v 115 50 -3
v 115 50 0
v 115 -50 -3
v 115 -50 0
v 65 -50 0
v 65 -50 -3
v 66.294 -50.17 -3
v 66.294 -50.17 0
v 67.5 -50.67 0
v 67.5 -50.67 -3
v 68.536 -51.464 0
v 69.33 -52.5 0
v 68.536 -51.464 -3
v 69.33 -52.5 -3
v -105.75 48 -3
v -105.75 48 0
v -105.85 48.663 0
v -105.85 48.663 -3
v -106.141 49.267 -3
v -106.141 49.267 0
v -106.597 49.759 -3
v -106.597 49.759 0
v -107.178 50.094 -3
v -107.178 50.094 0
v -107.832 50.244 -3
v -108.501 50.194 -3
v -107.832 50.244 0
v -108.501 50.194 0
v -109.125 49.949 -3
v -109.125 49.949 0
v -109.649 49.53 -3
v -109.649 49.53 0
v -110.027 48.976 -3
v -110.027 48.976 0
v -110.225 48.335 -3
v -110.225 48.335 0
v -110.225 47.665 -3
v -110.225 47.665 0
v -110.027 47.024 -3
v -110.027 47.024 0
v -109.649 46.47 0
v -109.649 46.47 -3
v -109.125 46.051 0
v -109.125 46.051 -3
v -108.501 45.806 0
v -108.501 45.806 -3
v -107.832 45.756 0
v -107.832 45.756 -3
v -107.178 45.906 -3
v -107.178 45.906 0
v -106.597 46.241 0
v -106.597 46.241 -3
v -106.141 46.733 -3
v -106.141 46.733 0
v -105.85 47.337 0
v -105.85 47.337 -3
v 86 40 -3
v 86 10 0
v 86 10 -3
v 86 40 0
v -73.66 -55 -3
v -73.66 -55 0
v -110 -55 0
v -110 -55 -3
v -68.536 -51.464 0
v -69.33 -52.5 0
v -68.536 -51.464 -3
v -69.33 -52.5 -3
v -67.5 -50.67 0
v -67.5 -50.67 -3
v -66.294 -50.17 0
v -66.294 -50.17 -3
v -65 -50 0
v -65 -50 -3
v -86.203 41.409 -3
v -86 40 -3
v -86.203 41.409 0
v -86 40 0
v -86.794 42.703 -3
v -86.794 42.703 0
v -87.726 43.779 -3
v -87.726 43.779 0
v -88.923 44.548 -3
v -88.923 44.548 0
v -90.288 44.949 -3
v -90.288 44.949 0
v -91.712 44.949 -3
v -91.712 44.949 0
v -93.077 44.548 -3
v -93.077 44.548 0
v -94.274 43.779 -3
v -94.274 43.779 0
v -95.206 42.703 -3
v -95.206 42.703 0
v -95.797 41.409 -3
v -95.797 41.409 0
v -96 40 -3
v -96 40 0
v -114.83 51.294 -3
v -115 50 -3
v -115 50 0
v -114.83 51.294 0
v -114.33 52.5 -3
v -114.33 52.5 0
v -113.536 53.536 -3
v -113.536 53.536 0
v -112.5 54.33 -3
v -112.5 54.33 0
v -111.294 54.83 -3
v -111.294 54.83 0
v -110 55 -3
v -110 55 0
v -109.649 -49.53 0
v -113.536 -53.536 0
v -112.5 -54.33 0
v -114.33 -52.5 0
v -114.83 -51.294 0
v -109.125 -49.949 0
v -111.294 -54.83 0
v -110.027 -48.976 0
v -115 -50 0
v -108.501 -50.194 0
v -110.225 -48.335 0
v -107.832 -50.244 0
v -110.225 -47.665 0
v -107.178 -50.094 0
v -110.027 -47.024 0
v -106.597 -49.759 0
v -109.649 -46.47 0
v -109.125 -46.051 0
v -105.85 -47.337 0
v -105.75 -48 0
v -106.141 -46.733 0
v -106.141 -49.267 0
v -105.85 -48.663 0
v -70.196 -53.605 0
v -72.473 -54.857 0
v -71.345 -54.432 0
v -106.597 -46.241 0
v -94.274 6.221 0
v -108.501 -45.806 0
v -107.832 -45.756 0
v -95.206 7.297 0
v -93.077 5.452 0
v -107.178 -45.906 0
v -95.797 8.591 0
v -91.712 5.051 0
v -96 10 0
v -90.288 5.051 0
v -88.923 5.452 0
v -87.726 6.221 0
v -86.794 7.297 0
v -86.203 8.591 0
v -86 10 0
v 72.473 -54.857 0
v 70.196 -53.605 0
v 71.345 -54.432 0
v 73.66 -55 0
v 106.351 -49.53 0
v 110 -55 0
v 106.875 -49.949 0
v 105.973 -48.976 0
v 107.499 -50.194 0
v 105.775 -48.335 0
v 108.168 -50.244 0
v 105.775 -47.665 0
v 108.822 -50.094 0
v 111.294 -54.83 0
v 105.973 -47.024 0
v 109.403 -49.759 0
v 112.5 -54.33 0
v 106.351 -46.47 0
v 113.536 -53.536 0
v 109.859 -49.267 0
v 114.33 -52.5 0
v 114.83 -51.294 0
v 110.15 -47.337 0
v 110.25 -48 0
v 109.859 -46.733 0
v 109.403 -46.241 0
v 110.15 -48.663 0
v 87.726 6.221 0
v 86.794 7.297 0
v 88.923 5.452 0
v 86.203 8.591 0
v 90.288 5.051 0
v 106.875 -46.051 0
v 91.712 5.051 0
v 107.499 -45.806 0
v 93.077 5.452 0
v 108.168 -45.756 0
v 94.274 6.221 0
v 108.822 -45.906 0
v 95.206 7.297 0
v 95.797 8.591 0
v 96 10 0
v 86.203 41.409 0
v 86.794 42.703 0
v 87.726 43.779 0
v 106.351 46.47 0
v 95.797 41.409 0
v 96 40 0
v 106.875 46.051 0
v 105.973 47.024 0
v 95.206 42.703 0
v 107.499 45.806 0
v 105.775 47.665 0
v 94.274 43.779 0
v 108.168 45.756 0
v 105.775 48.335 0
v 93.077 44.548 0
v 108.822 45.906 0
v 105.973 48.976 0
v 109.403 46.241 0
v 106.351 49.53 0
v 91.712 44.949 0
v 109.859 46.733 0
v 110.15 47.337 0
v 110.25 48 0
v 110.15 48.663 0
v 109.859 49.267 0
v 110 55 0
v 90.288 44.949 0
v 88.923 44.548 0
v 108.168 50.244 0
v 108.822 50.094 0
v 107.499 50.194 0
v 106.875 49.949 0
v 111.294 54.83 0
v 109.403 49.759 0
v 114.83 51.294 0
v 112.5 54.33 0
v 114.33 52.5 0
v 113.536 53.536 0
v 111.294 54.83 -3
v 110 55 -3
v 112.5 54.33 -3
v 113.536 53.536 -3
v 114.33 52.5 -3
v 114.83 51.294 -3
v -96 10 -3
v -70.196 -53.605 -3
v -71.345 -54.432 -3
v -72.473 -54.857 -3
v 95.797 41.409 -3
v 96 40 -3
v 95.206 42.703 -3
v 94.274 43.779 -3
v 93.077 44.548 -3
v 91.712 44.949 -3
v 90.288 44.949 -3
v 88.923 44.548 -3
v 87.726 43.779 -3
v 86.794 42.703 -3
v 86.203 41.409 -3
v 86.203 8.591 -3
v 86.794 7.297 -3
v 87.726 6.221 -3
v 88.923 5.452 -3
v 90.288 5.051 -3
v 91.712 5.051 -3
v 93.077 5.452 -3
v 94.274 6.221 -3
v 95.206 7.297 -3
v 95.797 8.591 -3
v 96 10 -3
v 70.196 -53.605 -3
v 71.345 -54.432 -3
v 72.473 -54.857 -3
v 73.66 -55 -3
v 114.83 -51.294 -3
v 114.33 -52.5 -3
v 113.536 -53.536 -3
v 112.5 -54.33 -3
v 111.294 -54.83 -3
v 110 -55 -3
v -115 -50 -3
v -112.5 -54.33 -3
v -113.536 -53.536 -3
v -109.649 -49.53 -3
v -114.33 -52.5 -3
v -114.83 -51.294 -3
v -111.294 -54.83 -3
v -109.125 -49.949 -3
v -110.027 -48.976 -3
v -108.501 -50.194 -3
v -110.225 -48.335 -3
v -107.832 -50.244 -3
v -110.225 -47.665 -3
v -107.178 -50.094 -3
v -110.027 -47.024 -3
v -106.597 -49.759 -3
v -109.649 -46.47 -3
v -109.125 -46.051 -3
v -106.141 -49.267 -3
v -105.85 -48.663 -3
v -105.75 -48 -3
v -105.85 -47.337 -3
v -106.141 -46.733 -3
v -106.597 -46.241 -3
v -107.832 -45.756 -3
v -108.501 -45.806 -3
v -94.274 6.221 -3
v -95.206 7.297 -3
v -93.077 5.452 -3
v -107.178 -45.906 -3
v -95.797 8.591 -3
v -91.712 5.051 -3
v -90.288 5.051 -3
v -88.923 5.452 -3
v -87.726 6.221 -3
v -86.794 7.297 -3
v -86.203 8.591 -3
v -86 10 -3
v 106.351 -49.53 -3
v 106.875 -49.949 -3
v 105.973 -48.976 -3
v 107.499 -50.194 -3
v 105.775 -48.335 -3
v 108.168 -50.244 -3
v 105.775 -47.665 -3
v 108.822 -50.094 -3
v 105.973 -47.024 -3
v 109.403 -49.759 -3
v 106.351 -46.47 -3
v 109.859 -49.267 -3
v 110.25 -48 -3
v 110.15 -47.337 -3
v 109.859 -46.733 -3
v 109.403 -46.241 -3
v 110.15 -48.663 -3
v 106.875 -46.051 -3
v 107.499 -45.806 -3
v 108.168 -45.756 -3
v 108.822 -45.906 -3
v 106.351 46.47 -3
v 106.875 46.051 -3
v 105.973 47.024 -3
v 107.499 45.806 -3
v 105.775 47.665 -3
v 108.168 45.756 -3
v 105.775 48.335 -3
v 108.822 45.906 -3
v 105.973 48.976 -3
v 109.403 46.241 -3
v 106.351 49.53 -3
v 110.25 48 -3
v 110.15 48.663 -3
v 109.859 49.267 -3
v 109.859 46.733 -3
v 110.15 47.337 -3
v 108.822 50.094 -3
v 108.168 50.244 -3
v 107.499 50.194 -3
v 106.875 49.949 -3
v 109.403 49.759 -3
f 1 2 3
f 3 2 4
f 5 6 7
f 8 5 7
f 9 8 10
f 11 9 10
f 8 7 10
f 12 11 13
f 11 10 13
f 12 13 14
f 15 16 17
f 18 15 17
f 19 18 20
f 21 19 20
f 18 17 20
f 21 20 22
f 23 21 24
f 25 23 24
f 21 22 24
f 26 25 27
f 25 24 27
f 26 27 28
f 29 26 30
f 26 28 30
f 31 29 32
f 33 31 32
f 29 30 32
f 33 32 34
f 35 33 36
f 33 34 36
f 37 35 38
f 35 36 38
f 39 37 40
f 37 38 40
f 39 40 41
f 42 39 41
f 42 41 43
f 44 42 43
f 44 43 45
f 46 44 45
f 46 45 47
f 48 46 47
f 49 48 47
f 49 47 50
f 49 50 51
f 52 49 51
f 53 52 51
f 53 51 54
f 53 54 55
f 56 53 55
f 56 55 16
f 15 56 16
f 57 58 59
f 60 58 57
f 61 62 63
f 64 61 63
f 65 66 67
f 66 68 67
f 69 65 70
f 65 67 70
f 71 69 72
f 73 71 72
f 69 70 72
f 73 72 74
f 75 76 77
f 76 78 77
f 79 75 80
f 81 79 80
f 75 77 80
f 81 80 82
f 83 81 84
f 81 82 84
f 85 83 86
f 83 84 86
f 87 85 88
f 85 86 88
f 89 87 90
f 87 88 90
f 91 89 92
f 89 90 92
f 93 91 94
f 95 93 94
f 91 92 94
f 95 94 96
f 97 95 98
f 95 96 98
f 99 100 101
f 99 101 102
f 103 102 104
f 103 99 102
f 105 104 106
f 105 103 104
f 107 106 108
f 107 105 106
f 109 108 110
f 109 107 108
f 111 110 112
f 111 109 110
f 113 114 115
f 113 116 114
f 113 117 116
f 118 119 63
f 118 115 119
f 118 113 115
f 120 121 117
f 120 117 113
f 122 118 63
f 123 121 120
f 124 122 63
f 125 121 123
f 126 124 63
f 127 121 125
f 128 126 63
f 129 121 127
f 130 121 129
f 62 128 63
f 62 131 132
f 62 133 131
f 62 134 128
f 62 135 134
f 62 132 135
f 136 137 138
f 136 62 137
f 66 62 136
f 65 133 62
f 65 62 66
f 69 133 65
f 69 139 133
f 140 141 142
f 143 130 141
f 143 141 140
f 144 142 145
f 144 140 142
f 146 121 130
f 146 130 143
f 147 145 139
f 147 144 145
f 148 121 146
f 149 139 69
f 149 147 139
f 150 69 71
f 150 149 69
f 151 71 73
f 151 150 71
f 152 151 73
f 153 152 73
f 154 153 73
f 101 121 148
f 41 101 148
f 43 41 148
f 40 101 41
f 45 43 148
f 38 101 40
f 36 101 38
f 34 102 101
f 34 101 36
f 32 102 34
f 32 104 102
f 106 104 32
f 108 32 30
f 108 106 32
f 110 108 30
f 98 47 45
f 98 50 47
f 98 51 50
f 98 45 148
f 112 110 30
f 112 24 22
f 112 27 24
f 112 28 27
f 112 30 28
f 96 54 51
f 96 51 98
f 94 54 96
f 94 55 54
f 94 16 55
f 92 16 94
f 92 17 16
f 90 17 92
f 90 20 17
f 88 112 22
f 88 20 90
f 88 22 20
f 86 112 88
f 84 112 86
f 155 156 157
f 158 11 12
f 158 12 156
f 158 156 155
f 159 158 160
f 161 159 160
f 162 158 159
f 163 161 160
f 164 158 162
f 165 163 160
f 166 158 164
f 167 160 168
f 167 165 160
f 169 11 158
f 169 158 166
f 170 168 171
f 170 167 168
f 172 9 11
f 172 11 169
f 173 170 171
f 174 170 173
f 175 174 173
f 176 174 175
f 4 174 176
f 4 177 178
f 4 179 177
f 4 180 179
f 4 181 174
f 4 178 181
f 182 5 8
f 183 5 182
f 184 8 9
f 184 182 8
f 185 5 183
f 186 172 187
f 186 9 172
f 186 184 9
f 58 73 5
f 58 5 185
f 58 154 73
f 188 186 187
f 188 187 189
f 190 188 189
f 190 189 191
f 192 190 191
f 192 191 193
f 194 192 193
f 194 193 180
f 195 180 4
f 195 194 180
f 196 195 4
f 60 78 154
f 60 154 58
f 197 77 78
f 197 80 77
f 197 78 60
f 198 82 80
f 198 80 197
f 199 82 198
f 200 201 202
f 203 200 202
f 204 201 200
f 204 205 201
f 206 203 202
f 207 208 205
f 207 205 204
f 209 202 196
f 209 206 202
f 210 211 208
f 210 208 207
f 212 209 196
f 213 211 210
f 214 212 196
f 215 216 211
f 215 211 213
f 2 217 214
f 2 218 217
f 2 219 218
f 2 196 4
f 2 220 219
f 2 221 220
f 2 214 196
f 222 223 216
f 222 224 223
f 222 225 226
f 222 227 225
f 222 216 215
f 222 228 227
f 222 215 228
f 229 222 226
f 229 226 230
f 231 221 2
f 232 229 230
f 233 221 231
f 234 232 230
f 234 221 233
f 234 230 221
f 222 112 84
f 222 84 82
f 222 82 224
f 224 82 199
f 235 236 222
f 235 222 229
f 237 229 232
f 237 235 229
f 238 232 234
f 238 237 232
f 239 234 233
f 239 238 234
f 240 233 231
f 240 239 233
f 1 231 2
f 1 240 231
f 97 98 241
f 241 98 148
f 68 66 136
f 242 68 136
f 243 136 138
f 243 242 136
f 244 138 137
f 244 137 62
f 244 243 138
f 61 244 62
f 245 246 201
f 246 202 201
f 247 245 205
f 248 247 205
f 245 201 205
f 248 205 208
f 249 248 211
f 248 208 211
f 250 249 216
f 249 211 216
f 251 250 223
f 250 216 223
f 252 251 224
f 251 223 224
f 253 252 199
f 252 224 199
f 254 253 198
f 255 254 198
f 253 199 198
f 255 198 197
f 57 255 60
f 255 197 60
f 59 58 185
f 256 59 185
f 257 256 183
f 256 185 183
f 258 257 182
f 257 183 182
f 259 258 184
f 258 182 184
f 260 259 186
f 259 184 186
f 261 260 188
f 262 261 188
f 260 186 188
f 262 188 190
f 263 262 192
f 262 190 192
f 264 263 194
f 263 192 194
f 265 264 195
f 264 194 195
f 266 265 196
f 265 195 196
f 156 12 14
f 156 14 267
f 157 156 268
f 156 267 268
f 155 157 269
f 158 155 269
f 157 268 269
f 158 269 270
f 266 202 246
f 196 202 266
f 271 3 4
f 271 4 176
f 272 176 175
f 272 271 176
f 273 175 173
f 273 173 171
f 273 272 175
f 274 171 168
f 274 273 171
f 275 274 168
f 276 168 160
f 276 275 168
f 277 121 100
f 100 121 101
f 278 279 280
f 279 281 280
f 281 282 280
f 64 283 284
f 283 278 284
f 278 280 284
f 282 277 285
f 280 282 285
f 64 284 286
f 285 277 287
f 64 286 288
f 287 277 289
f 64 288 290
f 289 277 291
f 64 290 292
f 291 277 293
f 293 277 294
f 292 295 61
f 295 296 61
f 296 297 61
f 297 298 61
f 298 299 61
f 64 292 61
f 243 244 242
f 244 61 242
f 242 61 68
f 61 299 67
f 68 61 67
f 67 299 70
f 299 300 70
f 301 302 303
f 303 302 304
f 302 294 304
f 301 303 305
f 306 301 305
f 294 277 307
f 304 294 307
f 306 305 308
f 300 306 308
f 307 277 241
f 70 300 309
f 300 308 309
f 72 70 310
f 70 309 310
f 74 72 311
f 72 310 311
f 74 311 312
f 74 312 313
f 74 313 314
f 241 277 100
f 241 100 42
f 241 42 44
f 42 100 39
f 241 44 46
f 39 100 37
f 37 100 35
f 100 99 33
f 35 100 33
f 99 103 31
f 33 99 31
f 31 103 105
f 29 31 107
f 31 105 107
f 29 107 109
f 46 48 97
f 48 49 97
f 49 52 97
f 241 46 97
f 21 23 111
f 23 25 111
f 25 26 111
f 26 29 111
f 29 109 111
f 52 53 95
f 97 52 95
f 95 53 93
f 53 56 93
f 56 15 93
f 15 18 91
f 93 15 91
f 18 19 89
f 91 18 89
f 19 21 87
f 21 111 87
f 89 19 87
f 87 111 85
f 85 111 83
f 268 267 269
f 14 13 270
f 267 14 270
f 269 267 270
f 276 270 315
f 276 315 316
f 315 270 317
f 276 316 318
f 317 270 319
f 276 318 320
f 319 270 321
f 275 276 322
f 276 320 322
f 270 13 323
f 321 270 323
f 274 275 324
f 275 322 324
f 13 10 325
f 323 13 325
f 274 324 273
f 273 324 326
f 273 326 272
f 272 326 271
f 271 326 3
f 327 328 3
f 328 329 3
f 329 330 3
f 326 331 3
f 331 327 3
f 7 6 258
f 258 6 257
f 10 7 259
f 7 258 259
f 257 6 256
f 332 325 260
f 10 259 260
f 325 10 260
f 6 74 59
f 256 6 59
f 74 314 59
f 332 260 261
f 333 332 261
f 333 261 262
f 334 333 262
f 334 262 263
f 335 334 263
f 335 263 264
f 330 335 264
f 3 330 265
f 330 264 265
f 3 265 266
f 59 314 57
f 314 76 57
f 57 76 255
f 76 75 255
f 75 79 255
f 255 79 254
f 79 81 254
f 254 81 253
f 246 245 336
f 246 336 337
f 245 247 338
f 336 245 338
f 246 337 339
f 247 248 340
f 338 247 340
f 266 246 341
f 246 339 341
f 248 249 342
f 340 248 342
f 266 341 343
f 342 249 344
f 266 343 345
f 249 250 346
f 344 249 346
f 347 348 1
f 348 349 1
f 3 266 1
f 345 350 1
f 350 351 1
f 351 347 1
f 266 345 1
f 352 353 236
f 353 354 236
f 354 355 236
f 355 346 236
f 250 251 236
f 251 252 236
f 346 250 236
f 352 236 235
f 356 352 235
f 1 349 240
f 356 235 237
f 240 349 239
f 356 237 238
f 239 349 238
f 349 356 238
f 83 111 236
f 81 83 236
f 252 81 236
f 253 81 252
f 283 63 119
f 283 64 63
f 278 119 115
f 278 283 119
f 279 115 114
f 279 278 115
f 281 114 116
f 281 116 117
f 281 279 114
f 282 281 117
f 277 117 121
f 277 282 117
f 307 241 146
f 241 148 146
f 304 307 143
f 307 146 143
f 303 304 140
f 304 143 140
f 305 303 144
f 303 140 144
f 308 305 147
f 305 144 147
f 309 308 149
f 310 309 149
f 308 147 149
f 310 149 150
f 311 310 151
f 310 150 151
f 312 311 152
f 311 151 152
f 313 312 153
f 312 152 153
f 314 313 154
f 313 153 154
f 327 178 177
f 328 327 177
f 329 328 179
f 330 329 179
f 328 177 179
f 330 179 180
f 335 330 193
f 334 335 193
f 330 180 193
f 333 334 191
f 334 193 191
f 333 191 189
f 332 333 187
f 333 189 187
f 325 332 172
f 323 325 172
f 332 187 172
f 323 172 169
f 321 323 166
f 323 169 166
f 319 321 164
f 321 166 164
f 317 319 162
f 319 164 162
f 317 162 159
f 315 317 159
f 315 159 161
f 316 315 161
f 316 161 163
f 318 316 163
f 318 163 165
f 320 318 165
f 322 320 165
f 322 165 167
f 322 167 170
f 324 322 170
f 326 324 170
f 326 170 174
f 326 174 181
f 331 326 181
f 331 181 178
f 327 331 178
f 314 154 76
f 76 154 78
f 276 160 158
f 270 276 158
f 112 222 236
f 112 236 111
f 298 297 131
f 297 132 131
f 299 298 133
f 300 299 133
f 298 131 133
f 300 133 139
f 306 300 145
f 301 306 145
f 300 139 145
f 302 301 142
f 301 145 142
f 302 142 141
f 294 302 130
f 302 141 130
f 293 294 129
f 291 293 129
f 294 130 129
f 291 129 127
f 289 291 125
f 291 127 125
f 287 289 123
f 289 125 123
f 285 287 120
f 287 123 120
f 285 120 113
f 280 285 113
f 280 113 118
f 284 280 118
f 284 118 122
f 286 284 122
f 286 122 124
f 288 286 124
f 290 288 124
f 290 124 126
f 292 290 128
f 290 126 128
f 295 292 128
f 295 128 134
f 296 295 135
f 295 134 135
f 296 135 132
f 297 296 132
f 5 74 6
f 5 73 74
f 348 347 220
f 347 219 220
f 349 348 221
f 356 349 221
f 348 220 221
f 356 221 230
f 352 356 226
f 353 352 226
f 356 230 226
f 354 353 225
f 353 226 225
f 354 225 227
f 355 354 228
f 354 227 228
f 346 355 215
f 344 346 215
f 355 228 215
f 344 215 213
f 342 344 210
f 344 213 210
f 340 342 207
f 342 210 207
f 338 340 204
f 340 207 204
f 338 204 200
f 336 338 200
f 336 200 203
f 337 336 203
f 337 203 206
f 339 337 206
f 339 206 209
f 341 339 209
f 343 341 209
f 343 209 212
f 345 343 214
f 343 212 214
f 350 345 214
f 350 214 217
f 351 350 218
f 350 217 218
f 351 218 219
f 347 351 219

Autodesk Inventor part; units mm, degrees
ref_plane "YZ Plane" through (0, 0, 0) normal (1, 0, 0) x (0, 1, 0)
ref_plane "XZ Plane" through (0, 0, 0) normal (0, 1, 0) x (-1, 0, 0)
ref_plane "XY Plane" through (0, 0, 0) normal (0, 0, 1) x (1, 0, 0)
sketch "Sketch1" plane through (0, 0, 0) normal (0, 0, 1) x (1, 0, 0)
  line L0 (-92.5, -50) -> (92.5, -50)
  line L1 (92.5, -50) -> (92.5, 50)
  line L2 (92.5, 50) -> (-92.5, 50)
  line L3 (-92.5, 50) -> (-92.5, -50)
  line L4 (-92.5, -50) -> (92.5, 50) construction
  line L5 (92.5, -50) -> (-92.5, 50) construction
  line L6 (70, 55) -> (115, 55)
  line L7 (115, 55) -> (115, 45)
  line L8 (115, 45) -> (70, 45)
  line L9 (70, 45) -> (70, 55)
  line L10 (70, 55) -> (115, 45) construction
  line L11 (115, 55) -> (70, 45) construction
  line L12 (70, -45) -> (115, -45)
  line L13 (115, -45) -> (115, -55)
  line L14 (115, -55) -> (70, -55)
  line L15 (70, -55) -> (70, -45)
  line L16 (70, -45) -> (115, -55) construction
  line L17 (115, -45) -> (70, -55) construction
  line L18 (-115, -45) -> (-70, -45)
  line L19 (-70, -45) -> (-70, -55)
  line L20 (-70, -55) -> (-115, -55)
  line L21 (-115, -55) -> (-115, -45)
  line L22 (-115, -45) -> (-70, -55) construction
  line L23 (-70, -45) -> (-115, -55) construction
  line L24 (-115, 55) -> (-70, 55)
  line L25 (-70, 55) -> (-70, 45)
  line L26 (-70, 45) -> (-115, 45)
  line L27 (-115, 45) -> (-115, 55)
  line L28 (-115, 55) -> (-70, 45) construction
  line L29 (-70, 55) -> (-115, 45) construction
  line L30 (70, 45) -> (115, 45)
  line L31 (115, 45) -> (115, -45)
  line L32 (115, -45) -> (70, -45)
  line L33 (70, -45) -> (70, 45)
  line L34 (70, 45) -> (115, -45) construction
  line L35 (115, 45) -> (70, -45) construction
  line L36 (-115, 45) -> (-70, 45)
  line L37 (-70, 45) -> (-70, -45)
  line L38 (-70, -45) -> (-115, -45)
  line L39 (-115, -45) -> (-115, 45)
  line L40 (-115, 45) -> (-70, -45) construction
  line L41 (-70, 45) -> (-115, -45) construction
  line L42 (115, 45) -> (115, 25)
  line L43 (115, -45) -> (115, -25)
  line L44 (-115, -45) -> (-115, -25)
  line L45 (-115, 45) -> (-115, 25)
  line L46 (70, 55) -> (-70, 55)
  line L47 (-70, 55) -> (-70, 50)
  line L48 (-70, 50) -> (70, 50)
  line L49 (70, 50) -> (70, 55)
  point P0 (0, 0)
  point P1 (0, 0)
  point P2 (92.5, 0)
  point P3 (-92.5, 0)
  point P4 (-70, -50)
  point P5 (70, -50)
  dimension "d0" = 185
  dimension "d1" = 100
  dimension "d2" = 45
  dimension "d3" = 10
  dimension "d4" = 45
  dimension "d5" = 10
  dimension "d6" = 45
  dimension "d7" = 45
  dimension "d8" = 10
  dimension "d9" = 45
  dimension "d10" = 90
  dimension "d11" = 20
  dimension "d12" = 20
  dimension "d13" = 20
  dimension "d14" = 20
  dimension "d15" = 45
extrude "Extrusion1" add sketch "Sketch1" against normal blind 3
fillet "Fillet1" radius 5 8 edges at (-115, 55, -1.5) (115, 55, -1.5) (115, -55, -1.5) (70, -55, -1.5) (70, -50, -1.5) (-70, -50, -1.5) (-70, -55, -1.5) (-115, -55, -1.5)
sketch "Sketch2" plane through (0, 0, 0) normal (0, 0, 1) x (1, 0, 0)
  circle A0 centre (-91, 40) radius 5
  circle A1 centre (-91, 10) radius 5
  line L0 (-96, 40) -> (-96, 10)
  line L1 (-86, 10) -> (-86, 40)
  line L2 (-73.6603, 55) -> (-110, 55) projected
  line L3 (-115, 50) -> (-115, -50) projected
  circle A2 centre (-108, 48) radius 2.25
  line L4 (0, 60.4736) -> (0, -65.7733) construction
  circle A3 centre (91, 40) radius 5
  circle A4 centre (91, 10) radius 5
  line L5 (96, 40) -> (96, 10)
  line L6 (86, 10) -> (86, 40)
  circle A5 centre (108, 48) radius 2.25
  line L7 (-147.6516, 0) -> (131.888, 0) construction
  circle A6 centre (-108, -48) radius 2.25
  circle A7 centre (108, -48) radius 2.25
  point P0 (0, 0)
  dimension "d19" = 10
  dimension "d20" = 10
  dimension "d24" = 15
  dimension "d25" = 24
  dimension "d26" = 24
  dimension "d27" = 19
  dimension "d28" = 45
  dimension "d32" = 7
  dimension "d33" = 7
extrude "Extrusion2" cut sketch "Sketch2" against normal blind 3
properties part number "CONTROLBOARD_KLEP"
